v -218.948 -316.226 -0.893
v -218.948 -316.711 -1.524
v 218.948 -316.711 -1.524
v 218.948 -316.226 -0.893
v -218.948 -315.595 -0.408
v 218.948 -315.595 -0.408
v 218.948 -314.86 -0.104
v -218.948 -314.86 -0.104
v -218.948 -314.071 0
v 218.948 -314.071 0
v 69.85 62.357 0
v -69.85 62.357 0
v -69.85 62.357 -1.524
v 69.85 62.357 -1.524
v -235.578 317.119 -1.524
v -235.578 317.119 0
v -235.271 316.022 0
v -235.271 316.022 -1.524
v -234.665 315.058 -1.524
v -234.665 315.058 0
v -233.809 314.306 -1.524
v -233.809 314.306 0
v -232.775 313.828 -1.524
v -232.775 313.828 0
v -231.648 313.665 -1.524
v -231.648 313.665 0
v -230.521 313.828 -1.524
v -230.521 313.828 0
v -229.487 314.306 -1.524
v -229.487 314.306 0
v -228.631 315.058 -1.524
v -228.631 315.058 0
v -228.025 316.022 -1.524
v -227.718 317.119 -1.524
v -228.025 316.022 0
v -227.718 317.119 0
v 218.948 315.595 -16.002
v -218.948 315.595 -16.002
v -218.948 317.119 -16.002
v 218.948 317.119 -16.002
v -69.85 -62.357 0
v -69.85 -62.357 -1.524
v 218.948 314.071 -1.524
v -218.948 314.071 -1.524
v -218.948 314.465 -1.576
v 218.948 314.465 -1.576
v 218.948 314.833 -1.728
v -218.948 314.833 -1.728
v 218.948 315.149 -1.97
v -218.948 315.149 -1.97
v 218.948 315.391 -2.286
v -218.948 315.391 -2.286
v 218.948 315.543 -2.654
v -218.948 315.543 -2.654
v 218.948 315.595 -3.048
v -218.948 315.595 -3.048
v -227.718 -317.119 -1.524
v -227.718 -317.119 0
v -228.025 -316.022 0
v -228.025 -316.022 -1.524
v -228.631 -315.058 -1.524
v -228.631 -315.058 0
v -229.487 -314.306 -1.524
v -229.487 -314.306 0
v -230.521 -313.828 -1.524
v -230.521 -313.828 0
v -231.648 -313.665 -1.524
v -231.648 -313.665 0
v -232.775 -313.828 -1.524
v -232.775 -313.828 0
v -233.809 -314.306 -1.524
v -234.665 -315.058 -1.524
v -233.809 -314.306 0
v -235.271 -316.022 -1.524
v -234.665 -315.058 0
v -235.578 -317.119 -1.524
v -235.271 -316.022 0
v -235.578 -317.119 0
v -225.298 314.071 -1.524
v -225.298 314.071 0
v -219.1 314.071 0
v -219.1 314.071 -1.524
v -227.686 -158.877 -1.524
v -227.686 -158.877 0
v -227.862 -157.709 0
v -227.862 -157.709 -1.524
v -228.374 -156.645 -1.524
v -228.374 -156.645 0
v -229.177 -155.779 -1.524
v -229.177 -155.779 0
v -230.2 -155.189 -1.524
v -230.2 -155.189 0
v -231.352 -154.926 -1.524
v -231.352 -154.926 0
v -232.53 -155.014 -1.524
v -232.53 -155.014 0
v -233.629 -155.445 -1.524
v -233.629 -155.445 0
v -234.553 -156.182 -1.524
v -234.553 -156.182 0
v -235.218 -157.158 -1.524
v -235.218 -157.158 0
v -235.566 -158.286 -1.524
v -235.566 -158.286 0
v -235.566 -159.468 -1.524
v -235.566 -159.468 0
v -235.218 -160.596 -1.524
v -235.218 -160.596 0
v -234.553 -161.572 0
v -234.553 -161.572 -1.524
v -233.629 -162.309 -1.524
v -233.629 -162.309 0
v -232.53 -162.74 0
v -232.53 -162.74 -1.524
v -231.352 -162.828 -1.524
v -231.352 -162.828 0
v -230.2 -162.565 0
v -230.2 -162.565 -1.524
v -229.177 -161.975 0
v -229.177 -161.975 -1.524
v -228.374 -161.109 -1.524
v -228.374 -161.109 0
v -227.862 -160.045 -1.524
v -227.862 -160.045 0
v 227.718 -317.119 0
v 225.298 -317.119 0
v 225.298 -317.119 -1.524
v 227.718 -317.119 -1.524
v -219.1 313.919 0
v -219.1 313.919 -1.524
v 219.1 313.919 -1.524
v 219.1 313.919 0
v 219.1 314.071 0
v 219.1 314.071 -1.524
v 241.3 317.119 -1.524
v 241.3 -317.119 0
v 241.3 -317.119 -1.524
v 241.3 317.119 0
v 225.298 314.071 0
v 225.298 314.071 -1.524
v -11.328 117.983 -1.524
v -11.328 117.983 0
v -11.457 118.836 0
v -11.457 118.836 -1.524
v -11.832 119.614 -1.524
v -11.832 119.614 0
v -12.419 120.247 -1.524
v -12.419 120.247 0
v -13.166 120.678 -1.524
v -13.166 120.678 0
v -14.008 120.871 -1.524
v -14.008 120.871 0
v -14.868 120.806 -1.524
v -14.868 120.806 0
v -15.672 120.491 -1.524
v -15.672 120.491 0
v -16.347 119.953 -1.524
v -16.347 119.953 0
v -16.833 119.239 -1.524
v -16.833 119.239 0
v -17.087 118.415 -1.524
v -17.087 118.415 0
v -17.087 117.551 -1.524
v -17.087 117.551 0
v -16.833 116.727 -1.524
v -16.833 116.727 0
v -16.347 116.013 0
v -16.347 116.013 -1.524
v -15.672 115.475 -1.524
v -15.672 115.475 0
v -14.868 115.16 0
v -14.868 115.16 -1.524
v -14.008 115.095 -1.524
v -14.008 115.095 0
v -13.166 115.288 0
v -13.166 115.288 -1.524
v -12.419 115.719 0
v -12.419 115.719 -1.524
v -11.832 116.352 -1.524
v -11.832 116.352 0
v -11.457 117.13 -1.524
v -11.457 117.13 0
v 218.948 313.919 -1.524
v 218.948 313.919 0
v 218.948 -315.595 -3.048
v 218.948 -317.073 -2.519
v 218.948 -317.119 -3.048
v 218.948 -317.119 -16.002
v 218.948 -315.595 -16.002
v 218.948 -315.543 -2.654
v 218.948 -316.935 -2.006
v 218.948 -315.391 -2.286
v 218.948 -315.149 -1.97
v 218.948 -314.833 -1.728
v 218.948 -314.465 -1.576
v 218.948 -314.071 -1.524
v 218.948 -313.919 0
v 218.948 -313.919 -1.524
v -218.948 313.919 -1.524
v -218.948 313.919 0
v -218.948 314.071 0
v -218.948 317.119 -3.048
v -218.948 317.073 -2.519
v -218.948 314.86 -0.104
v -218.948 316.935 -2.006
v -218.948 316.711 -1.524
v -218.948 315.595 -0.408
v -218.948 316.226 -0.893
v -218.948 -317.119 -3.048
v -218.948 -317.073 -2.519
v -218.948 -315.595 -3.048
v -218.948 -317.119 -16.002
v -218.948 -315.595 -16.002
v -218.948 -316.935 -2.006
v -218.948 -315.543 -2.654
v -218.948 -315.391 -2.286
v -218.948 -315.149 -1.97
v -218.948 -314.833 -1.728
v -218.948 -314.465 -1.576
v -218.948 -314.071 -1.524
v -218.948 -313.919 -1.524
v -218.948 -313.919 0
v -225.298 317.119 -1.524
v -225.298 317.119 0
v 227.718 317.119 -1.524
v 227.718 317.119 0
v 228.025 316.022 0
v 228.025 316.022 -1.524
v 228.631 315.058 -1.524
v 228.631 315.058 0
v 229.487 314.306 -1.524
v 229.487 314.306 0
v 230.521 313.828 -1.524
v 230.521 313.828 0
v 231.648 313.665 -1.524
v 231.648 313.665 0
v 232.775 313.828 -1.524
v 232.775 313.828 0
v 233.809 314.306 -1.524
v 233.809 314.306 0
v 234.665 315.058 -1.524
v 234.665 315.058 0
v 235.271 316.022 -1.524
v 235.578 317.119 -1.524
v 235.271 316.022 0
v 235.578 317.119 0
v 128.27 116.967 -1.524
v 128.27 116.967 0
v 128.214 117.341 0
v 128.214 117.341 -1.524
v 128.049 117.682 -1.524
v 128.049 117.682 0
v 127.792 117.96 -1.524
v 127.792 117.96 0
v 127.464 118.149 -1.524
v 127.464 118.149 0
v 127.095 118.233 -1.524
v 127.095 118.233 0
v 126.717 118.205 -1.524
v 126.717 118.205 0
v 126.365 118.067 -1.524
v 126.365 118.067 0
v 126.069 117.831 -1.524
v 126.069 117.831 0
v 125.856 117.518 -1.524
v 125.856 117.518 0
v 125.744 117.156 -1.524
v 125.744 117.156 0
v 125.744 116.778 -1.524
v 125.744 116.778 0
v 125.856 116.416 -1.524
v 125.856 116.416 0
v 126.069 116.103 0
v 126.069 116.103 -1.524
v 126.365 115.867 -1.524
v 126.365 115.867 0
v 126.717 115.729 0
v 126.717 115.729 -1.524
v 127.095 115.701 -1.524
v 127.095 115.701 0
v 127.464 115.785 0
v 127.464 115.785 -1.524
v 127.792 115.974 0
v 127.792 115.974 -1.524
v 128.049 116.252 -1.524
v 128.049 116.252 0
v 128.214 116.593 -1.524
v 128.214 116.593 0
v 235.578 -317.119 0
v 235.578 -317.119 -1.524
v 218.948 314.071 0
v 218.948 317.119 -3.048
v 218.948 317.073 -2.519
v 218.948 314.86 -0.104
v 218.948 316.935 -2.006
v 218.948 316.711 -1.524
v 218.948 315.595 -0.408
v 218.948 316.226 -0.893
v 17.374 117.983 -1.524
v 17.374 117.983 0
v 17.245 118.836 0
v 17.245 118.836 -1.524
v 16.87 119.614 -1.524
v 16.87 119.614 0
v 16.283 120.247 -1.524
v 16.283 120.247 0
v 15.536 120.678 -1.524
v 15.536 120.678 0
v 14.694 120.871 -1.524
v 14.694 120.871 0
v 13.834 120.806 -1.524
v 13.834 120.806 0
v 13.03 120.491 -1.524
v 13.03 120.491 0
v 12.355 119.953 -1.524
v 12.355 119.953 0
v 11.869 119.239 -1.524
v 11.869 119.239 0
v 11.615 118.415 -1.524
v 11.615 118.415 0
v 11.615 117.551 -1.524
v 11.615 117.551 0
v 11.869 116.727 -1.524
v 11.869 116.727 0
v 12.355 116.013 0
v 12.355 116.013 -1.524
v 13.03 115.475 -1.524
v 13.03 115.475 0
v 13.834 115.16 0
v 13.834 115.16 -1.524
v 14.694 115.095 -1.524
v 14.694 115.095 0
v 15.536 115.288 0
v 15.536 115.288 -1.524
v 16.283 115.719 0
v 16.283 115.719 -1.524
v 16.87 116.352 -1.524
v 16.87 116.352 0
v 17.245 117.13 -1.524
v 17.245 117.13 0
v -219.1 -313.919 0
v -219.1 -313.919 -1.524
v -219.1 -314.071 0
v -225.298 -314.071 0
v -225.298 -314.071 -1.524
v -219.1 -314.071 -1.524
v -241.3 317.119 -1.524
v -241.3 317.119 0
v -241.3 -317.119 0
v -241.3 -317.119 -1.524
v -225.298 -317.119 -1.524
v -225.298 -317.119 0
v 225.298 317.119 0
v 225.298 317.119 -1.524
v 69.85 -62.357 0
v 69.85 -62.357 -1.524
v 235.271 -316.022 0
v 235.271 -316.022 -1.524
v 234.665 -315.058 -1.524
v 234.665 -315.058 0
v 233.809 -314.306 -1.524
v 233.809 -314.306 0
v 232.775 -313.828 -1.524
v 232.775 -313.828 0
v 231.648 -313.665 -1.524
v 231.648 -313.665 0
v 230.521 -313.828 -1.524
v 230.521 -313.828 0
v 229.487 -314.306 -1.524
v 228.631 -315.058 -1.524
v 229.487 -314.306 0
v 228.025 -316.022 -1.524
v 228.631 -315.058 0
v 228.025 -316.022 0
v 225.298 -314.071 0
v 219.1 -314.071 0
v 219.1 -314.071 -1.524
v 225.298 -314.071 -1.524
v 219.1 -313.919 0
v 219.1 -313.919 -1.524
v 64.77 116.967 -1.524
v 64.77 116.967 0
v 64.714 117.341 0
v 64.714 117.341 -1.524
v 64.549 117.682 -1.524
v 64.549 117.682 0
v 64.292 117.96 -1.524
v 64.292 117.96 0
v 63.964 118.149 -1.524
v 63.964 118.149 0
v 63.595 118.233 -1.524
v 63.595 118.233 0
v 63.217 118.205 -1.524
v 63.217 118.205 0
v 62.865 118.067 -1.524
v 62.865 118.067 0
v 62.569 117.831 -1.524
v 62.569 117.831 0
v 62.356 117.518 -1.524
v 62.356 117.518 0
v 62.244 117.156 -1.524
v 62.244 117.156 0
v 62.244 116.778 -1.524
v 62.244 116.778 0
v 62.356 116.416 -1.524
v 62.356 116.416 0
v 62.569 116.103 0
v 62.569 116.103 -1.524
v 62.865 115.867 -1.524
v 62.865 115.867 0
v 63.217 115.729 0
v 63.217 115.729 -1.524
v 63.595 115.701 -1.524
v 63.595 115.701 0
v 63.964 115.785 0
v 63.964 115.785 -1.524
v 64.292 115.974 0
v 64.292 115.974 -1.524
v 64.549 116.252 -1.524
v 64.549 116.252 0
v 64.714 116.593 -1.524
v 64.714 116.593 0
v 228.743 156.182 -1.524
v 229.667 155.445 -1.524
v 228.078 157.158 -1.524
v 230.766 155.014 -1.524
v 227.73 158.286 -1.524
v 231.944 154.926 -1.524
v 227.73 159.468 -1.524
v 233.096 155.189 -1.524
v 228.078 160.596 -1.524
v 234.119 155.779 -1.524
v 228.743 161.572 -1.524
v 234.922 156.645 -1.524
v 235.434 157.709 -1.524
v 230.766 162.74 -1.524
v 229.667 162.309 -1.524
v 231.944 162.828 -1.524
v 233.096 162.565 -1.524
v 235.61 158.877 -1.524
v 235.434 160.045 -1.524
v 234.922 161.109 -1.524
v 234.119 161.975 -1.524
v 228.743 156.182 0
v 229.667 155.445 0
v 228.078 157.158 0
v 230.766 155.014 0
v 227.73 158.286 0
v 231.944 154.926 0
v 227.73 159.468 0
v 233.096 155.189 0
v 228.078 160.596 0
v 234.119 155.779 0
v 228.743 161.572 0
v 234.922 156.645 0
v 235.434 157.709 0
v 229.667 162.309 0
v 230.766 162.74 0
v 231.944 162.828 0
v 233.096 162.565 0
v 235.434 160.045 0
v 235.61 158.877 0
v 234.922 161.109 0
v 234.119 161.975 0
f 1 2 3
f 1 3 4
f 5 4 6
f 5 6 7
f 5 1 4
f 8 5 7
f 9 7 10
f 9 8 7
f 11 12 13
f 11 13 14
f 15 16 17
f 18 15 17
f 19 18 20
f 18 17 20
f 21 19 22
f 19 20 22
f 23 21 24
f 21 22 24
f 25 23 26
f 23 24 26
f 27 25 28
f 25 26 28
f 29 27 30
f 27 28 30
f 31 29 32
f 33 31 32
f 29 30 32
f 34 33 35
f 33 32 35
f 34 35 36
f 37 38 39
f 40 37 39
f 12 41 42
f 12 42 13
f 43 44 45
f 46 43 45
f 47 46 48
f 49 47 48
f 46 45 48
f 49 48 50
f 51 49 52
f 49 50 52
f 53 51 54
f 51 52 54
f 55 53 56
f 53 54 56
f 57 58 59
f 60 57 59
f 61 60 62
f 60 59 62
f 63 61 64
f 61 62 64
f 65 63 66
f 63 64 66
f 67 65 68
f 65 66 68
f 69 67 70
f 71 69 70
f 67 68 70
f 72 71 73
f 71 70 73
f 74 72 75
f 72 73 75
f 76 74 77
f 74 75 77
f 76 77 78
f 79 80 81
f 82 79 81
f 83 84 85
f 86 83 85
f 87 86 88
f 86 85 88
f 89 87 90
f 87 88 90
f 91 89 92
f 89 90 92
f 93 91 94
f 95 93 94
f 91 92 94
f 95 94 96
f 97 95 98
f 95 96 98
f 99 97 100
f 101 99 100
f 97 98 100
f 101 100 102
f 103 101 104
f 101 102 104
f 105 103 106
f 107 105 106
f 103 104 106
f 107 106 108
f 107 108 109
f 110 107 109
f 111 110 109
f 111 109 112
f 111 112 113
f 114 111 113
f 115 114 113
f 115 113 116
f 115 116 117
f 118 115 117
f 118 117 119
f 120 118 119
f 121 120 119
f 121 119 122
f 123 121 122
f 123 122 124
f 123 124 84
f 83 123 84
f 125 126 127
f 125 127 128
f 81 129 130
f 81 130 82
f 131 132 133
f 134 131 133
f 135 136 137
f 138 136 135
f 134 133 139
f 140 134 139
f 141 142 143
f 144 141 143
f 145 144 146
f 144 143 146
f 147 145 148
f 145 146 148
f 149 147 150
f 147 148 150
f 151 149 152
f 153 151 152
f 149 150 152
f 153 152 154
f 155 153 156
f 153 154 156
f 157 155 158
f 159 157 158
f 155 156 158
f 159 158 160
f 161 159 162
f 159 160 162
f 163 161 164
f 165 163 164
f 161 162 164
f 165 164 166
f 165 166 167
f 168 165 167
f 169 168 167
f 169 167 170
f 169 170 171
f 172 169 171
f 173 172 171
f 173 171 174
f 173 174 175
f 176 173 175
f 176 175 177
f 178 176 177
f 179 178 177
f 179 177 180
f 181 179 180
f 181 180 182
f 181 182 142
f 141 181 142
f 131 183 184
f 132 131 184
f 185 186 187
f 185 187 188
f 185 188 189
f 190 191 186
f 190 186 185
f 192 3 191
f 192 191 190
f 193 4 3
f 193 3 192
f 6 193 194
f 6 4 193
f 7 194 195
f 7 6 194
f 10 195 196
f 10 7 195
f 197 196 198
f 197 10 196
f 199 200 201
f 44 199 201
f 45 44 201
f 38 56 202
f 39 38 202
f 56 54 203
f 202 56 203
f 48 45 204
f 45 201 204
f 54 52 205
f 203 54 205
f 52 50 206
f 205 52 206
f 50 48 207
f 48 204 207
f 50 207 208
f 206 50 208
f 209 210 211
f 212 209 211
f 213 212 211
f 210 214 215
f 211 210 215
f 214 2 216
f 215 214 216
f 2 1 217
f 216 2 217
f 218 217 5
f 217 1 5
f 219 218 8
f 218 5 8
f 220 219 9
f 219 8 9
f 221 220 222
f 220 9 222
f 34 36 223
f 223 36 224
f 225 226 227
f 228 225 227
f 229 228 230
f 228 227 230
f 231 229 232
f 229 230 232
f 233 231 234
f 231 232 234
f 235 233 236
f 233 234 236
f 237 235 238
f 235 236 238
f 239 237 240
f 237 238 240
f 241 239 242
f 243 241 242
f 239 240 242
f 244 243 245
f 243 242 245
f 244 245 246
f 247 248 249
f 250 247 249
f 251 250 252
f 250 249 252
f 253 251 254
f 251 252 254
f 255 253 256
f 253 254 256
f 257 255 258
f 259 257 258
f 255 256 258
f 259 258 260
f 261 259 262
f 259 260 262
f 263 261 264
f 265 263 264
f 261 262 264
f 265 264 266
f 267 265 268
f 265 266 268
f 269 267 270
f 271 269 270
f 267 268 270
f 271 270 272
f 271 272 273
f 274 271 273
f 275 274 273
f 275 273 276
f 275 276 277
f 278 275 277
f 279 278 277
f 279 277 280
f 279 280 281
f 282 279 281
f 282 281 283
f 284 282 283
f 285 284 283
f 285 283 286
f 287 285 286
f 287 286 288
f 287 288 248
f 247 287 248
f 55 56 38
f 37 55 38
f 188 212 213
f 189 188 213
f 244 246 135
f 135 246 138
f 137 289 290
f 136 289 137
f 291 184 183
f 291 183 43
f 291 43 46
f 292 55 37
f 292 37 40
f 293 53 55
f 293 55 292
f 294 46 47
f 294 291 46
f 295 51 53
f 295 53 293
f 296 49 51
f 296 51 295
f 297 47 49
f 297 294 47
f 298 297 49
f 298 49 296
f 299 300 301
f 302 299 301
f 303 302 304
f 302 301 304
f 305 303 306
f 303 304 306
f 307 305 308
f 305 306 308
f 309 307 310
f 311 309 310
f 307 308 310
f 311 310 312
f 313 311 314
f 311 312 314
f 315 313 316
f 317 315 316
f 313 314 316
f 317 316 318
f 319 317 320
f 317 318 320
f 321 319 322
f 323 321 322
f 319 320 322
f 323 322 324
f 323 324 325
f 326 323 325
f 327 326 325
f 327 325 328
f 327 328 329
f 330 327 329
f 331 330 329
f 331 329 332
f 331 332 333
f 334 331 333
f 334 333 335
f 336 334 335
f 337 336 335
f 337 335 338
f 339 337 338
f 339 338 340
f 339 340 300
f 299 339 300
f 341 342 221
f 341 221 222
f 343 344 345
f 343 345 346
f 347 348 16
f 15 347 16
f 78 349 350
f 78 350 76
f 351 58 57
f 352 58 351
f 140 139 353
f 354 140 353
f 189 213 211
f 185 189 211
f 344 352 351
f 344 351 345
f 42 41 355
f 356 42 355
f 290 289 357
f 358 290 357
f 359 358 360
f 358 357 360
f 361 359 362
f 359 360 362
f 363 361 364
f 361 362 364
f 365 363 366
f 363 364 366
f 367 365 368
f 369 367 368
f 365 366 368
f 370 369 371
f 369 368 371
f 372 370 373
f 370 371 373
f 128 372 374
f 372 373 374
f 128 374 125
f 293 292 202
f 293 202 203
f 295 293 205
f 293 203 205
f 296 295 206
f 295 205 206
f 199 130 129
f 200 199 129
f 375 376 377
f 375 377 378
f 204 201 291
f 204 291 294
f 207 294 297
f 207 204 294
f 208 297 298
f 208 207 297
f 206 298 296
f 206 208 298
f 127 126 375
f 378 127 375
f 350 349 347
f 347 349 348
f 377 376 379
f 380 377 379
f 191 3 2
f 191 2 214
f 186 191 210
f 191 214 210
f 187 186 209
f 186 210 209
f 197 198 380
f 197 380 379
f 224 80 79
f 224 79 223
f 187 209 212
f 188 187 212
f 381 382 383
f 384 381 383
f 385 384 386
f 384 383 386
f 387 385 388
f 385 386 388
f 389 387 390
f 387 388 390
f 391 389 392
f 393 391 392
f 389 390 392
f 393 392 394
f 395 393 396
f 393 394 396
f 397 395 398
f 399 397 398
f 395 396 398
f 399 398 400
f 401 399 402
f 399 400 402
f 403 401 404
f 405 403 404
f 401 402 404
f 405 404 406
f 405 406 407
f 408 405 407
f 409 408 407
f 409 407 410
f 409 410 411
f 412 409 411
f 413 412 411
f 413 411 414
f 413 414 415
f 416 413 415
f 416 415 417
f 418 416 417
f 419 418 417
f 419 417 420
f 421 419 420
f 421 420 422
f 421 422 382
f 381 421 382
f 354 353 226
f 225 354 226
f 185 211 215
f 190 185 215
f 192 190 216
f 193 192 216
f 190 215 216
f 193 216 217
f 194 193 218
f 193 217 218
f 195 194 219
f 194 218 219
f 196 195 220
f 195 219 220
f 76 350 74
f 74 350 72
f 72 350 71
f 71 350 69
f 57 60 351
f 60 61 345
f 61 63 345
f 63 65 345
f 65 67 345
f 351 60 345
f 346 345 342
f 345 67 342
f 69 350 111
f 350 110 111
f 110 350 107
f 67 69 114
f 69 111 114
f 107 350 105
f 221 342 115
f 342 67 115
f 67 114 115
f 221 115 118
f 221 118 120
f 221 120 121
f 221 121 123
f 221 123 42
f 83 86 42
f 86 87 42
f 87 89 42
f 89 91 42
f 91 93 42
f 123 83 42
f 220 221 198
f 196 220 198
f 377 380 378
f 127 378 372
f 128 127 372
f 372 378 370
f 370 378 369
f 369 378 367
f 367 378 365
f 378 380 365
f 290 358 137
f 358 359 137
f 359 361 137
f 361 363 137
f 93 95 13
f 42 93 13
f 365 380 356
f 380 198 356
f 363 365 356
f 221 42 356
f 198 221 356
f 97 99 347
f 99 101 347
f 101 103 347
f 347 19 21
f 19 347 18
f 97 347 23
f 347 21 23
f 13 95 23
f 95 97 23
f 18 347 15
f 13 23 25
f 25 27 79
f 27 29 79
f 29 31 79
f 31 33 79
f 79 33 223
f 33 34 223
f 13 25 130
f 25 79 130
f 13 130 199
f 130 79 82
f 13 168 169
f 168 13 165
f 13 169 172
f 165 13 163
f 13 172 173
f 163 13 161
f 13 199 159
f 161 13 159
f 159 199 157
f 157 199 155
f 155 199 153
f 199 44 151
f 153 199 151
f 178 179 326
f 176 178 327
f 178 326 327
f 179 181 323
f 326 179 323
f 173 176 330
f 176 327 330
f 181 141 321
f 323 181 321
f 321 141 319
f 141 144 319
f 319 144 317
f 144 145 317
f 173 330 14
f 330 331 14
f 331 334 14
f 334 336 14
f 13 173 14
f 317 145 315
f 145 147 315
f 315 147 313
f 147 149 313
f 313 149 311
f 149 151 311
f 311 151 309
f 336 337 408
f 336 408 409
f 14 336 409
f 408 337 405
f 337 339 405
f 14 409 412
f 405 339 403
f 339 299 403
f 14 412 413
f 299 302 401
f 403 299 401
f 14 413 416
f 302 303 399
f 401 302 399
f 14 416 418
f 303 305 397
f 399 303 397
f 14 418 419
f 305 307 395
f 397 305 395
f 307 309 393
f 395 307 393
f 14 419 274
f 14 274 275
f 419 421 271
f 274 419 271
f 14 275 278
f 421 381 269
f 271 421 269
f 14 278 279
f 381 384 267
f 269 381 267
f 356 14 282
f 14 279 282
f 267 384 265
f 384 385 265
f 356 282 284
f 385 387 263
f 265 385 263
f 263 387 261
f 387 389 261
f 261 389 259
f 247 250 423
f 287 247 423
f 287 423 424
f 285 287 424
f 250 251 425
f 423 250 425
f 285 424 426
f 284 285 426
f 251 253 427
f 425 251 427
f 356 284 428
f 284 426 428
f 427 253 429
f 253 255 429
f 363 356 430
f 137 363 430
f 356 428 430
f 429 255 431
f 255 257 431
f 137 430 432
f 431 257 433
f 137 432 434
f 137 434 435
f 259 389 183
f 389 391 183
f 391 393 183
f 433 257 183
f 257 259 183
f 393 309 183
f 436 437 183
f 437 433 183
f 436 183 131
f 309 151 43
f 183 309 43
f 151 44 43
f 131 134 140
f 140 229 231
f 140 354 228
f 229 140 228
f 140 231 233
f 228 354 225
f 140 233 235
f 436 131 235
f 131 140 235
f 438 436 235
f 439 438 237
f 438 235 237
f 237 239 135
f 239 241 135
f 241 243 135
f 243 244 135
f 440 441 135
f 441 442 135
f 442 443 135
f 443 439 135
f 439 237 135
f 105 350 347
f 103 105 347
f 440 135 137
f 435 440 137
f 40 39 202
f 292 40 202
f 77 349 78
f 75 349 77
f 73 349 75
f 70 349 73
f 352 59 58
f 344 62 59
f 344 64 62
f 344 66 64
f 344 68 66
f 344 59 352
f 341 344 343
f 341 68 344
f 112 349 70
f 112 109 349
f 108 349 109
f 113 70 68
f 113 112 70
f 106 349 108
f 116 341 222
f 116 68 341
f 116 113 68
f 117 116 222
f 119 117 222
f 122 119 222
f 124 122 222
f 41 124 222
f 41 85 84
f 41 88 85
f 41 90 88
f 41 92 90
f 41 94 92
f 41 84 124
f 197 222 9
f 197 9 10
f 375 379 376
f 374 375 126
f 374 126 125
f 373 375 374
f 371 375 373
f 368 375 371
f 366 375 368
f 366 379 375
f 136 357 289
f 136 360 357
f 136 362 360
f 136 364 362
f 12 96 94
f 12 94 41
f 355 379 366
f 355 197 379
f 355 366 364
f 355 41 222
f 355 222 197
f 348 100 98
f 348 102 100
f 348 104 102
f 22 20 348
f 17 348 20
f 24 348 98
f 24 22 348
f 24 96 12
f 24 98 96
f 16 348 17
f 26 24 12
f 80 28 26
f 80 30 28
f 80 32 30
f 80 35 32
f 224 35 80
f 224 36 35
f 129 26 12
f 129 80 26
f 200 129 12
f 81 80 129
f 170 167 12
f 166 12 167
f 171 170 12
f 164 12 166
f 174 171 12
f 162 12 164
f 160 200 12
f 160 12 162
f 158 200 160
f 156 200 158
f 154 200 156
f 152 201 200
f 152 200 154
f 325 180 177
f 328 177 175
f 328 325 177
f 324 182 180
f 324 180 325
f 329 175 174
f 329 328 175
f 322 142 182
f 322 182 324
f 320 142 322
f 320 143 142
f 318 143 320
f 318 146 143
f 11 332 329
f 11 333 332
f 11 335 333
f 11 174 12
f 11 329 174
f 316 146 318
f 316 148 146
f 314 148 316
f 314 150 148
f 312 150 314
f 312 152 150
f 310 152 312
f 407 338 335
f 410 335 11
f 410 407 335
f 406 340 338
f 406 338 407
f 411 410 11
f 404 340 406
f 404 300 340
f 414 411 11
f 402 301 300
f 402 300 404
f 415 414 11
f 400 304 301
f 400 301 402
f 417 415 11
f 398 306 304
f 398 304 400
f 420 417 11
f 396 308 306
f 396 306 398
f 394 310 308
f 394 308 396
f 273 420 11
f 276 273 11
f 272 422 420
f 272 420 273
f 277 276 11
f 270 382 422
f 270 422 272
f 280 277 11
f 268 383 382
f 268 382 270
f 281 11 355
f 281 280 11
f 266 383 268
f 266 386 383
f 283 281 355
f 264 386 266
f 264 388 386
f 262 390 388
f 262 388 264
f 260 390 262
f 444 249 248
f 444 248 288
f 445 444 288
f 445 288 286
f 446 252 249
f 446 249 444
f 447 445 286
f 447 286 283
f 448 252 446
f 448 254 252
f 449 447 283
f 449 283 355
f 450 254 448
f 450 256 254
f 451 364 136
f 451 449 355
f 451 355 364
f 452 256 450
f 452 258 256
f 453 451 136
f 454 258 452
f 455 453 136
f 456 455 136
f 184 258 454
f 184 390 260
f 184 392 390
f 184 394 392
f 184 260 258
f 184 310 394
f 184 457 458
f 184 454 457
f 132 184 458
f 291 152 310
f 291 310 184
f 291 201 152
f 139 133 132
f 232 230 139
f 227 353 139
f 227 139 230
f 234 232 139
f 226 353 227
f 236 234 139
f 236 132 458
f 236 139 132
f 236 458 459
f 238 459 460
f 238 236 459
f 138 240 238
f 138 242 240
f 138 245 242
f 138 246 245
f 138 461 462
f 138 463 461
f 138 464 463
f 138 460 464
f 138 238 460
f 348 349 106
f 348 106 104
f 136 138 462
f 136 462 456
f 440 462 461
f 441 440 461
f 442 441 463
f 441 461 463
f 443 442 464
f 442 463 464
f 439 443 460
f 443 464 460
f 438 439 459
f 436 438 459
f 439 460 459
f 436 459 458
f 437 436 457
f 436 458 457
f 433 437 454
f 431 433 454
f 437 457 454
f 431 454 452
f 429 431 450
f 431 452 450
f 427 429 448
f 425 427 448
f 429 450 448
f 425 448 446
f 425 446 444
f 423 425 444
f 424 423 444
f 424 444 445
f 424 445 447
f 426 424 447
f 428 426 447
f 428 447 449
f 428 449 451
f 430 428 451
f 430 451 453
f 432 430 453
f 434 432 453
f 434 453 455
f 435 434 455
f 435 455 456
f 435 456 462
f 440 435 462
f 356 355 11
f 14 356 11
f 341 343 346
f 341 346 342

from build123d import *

# Parameters (mm, degrees)
CROQUIS1_W                   = 482.6
CROQUIS1_H                   = 634.238
BRIDA_BASE1_DEPTH            = 1.524
CROQUIS6_R                   = 3.9624
CROQUIS6_W                   = 6.35
CROQUIS6_H                   = 3.048
CORTAR_EXTRUIR1_DEPTH        = 399.487732229
BRIDA_START                  = -218.948
BRIDA_DE_ARISTA1_DEPTH       = 437.896
BRIDA_START_2                = -219.1004
BRIDA_DE_ARISTA1_2_OUTLINE_W = 0.1524
BRIDA_DE_ARISTA1_2_OUTLINE_H = 1.524
BRIDA_DE_ARISTA1_2_DEPTH     = 0.1524
BRIDA_START_3                = 218.948
BRIDA_DE_ARISTA1_3_OUTLINE_W = 0.1524
BRIDA_DE_ARISTA1_3_OUTLINE_H = 1.524
BRIDA_DE_ARISTA1_3_DEPTH     = 0.1524
BRIDA_DE_ARISTA1_4_DEPTH     = 437.896
CORTAR_EXTRUIR2_REACH        = 400.806
CROQUIS13_R                  = 3.9624
CROQUIS13_R_2                = 2.8956
CROQUIS13_R_3                = 1.27
CROQUIS13_W                  = 139.7
CROQUIS13_H                  = 124.714


# Read off the part's stored shape, not the designer's step: Brida de arista1
# Sheet-metal steps are written as plain solids
with BuildPart() as part:
    # Croquis1 → Brida base1 (new body)
    with BuildSketch(Plane.XY):
        Rectangle(CROQUIS1_W, CROQUIS1_H)
    extrude(amount=-BRIDA_BASE1_DEPTH)

    # Croquis6 → Cortar-Extruir1 (cut, through all)
    with BuildSketch(Plane.XY):
        with Locations((231.648, 317.627)):
            Circle(CROQUIS6_R)
        with Locations((-231.648, 317.627)):
            Circle(CROQUIS6_R)
        with Locations((-231.648, -317.627)):
            Circle(CROQUIS6_R)
        with Locations((231.648, -317.627)):
            Circle(CROQUIS6_R)
        with Locations((-222.123, 315.595)):
            Rectangle(CROQUIS6_W, CROQUIS6_H)
        with Locations((222.123, 315.595)):
            Rectangle(CROQUIS6_W, CROQUIS6_H)
        with Locations((-222.123, -315.595)):
            Rectangle(CROQUIS6_W, CROQUIS6_H)
        with Locations((222.123, -315.595)):
            Rectangle(CROQUIS6_W, CROQUIS6_H)
    extrude(amount=-CORTAR_EXTRUIR1_DEPTH, mode=Mode.SUBTRACT)

    # Brida de arista1 outline → Brida de arista1 (cut)
    with BuildSketch(Plane.YZ.offset(BRIDA_START)):
        with BuildLine():
            ThreePointArc((-316.710645431, -1.524), (-315.595, -0.408354569), (-314.071, 0))
            Line((-314.071, 0), (-317.119, 0))
            Line((-317.119, 0), (-317.119, -1.524))
            Line((-317.119, -1.524), (-316.710645431, -1.524))
        make_face()
        with BuildLine():
            Line((317.119, 0), (314.071, 0))
            ThreePointArc((314.071, 0), (315.595, -0.408354569), (316.710645431, -1.524))
            Line((316.710645431, -1.524), (317.119, -1.524))
            Line((317.119, -1.524), (317.119, 0))
        make_face()
    extrude(amount=BRIDA_DE_ARISTA1_DEPTH, mode=Mode.SUBTRACT)

    # Brida de arista1 2 outline → Brida de arista1 2 (cut)
    with BuildSketch(Plane.YZ.offset(BRIDA_START_2)):
        with Locations((-313.9948, -0.762)):
            Rectangle(BRIDA_DE_ARISTA1_2_OUTLINE_W, BRIDA_DE_ARISTA1_2_OUTLINE_H)
        with Locations((313.9948, -0.762)):
            Rectangle(BRIDA_DE_ARISTA1_2_OUTLINE_W, BRIDA_DE_ARISTA1_2_OUTLINE_H)
    extrude(amount=BRIDA_DE_ARISTA1_2_DEPTH, mode=Mode.SUBTRACT)

    # Brida de arista1 3 outline → Brida de arista1 3 (cut)
    with BuildSketch(Plane.YZ.offset(BRIDA_START_3)):
        with Locations((-313.9948, -0.762)):
            Rectangle(BRIDA_DE_ARISTA1_3_OUTLINE_W, BRIDA_DE_ARISTA1_3_OUTLINE_H)
        with Locations((313.9948, -0.762)):
            Rectangle(BRIDA_DE_ARISTA1_3_OUTLINE_W, BRIDA_DE_ARISTA1_3_OUTLINE_H)
    extrude(amount=BRIDA_DE_ARISTA1_3_DEPTH, mode=Mode.SUBTRACT)

    # Brida de arista1 4 outline → Brida de arista1 4 (add)
    with BuildSketch(Plane.YZ.offset(BRIDA_START)):
        with BuildLine():
            ThreePointArc((-315.595, -3.048), (-315.148630735, -1.970369265), (-314.071, -1.524))
            Line((-314.071, -1.524), (-316.710645431, -1.524))
            ThreePointArc((-316.710645431, -1.524), (-317.015141918, -2.259119551), (-317.119, -3.048))
            Line((-317.119, -3.048), (-317.119, -16.002))
            Line((-317.119, -16.002), (-315.595, -16.002))
            Line((-315.595, -16.002), (-315.595, -3.048))
        make_face()
        with BuildLine():
            Line((316.710645431, -1.524), (314.071, -1.524))
            ThreePointArc((314.071, -1.524), (315.148630735, -1.970369265), (315.595, -3.048))
            Line((315.595, -3.048), (315.595, -16.002))
            Line((315.595, -16.002), (317.119, -16.002))
            Line((317.119, -16.002), (317.119, -3.048))
            ThreePointArc((317.119, -3.048), (317.015141918, -2.259119551), (316.710645431, -1.524))
        make_face()
    extrude(amount=BRIDA_DE_ARISTA1_4_DEPTH)

    # Croquis13 → Cortar-Extruir2 (cut, up to next)
    with BuildSketch(Plane.XY, mode=Mode.PRIVATE) as cortar_extruir2_sk1:
        with Locations((-231.648, -158.877)):
            Circle(CROQUIS13_R)
    cortar_extruir2_tool1 = extrude(cortar_extruir2_sk1.sketch, amount=-CORTAR_EXTRUIR2_REACH, mode=Mode.PRIVATE) & part.part
    # Croquis13 → Cortar-Extruir2 (cut, up to next)
    with BuildSketch(Plane.XY, mode=Mode.PRIVATE) as cortar_extruir2_sk2:
        with Locations((231.648, 158.877)):
            Circle(CROQUIS13_R)
    cortar_extruir2_tool2 = extrude(cortar_extruir2_sk2.sketch, amount=-CORTAR_EXTRUIR2_REACH, mode=Mode.PRIVATE) & part.part
    # Croquis13 → Cortar-Extruir2 (cut, up to next)
    with BuildSketch(Plane.XY, mode=Mode.PRIVATE) as cortar_extruir2_sk3:
        with Locations((-14.224, 117.983)):
            Circle(CROQUIS13_R_2)
    cortar_extruir2_tool3 = extrude(cortar_extruir2_sk3.sketch, amount=-CORTAR_EXTRUIR2_REACH, mode=Mode.PRIVATE) & part.part
    # Croquis13 → Cortar-Extruir2 (cut, up to next)
    with BuildSketch(Plane.XY, mode=Mode.PRIVATE) as cortar_extruir2_sk4:
        with Locations((63.5, 116.967)):
            Circle(CROQUIS13_R_3)
    cortar_extruir2_tool4 = extrude(cortar_extruir2_sk4.sketch, amount=-CORTAR_EXTRUIR2_REACH, mode=Mode.PRIVATE) & part.part
    # Croquis13 → Cortar-Extruir2 (cut, up to next)
    with BuildSketch(Plane.XY, mode=Mode.PRIVATE) as cortar_extruir2_sk5:
        with Locations((14.478, 117.983)):
            Circle(CROQUIS13_R_2)
    cortar_extruir2_tool5 = extrude(cortar_extruir2_sk5.sketch, amount=-CORTAR_EXTRUIR2_REACH, mode=Mode.PRIVATE) & part.part
    # Croquis13 → Cortar-Extruir2 (cut, up to next)
    with BuildSketch(Plane.XY, mode=Mode.PRIVATE) as cortar_extruir2_sk6:
        with Locations((127, 116.967)):
            Circle(CROQUIS13_R_3)
    cortar_extruir2_tool6 = extrude(cortar_extruir2_sk6.sketch, amount=-CORTAR_EXTRUIR2_REACH, mode=Mode.PRIVATE) & part.part
    # Croquis13 → Cortar-Extruir2 (cut, up to next)
    with BuildSketch(Plane.XY, mode=Mode.PRIVATE) as cortar_extruir2_sk7:
        Rectangle(CROQUIS13_W, CROQUIS13_H)
    cortar_extruir2_tool7 = extrude(cortar_extruir2_sk7.sketch, amount=-CORTAR_EXTRUIR2_REACH, mode=Mode.PRIVATE) & part.part
    add(cortar_extruir2_tool1.solids().sort_by_distance((-231.648, -158.877, 0))[0], mode=Mode.SUBTRACT)
    add(cortar_extruir2_tool2.solids().sort_by_distance((231.648, 158.877, 0))[0], mode=Mode.SUBTRACT)
    add(cortar_extruir2_tool3.solids().sort_by_distance((-14.224, 117.983, 0))[0], mode=Mode.SUBTRACT)
    add(cortar_extruir2_tool4.solids().sort_by_distance((63.5, 116.967, 0))[0], mode=Mode.SUBTRACT)
    add(cortar_extruir2_tool5.solids().sort_by_distance((14.478, 117.983, 0))[0], mode=Mode.SUBTRACT)
    add(cortar_extruir2_tool6.solids().sort_by_distance((127, 116.967, 0))[0], mode=Mode.SUBTRACT)
    add(cortar_extruir2_tool7.solids().sort_by_distance((0, 0, 0))[0], mode=Mode.SUBTRACT)


solid = part.part
